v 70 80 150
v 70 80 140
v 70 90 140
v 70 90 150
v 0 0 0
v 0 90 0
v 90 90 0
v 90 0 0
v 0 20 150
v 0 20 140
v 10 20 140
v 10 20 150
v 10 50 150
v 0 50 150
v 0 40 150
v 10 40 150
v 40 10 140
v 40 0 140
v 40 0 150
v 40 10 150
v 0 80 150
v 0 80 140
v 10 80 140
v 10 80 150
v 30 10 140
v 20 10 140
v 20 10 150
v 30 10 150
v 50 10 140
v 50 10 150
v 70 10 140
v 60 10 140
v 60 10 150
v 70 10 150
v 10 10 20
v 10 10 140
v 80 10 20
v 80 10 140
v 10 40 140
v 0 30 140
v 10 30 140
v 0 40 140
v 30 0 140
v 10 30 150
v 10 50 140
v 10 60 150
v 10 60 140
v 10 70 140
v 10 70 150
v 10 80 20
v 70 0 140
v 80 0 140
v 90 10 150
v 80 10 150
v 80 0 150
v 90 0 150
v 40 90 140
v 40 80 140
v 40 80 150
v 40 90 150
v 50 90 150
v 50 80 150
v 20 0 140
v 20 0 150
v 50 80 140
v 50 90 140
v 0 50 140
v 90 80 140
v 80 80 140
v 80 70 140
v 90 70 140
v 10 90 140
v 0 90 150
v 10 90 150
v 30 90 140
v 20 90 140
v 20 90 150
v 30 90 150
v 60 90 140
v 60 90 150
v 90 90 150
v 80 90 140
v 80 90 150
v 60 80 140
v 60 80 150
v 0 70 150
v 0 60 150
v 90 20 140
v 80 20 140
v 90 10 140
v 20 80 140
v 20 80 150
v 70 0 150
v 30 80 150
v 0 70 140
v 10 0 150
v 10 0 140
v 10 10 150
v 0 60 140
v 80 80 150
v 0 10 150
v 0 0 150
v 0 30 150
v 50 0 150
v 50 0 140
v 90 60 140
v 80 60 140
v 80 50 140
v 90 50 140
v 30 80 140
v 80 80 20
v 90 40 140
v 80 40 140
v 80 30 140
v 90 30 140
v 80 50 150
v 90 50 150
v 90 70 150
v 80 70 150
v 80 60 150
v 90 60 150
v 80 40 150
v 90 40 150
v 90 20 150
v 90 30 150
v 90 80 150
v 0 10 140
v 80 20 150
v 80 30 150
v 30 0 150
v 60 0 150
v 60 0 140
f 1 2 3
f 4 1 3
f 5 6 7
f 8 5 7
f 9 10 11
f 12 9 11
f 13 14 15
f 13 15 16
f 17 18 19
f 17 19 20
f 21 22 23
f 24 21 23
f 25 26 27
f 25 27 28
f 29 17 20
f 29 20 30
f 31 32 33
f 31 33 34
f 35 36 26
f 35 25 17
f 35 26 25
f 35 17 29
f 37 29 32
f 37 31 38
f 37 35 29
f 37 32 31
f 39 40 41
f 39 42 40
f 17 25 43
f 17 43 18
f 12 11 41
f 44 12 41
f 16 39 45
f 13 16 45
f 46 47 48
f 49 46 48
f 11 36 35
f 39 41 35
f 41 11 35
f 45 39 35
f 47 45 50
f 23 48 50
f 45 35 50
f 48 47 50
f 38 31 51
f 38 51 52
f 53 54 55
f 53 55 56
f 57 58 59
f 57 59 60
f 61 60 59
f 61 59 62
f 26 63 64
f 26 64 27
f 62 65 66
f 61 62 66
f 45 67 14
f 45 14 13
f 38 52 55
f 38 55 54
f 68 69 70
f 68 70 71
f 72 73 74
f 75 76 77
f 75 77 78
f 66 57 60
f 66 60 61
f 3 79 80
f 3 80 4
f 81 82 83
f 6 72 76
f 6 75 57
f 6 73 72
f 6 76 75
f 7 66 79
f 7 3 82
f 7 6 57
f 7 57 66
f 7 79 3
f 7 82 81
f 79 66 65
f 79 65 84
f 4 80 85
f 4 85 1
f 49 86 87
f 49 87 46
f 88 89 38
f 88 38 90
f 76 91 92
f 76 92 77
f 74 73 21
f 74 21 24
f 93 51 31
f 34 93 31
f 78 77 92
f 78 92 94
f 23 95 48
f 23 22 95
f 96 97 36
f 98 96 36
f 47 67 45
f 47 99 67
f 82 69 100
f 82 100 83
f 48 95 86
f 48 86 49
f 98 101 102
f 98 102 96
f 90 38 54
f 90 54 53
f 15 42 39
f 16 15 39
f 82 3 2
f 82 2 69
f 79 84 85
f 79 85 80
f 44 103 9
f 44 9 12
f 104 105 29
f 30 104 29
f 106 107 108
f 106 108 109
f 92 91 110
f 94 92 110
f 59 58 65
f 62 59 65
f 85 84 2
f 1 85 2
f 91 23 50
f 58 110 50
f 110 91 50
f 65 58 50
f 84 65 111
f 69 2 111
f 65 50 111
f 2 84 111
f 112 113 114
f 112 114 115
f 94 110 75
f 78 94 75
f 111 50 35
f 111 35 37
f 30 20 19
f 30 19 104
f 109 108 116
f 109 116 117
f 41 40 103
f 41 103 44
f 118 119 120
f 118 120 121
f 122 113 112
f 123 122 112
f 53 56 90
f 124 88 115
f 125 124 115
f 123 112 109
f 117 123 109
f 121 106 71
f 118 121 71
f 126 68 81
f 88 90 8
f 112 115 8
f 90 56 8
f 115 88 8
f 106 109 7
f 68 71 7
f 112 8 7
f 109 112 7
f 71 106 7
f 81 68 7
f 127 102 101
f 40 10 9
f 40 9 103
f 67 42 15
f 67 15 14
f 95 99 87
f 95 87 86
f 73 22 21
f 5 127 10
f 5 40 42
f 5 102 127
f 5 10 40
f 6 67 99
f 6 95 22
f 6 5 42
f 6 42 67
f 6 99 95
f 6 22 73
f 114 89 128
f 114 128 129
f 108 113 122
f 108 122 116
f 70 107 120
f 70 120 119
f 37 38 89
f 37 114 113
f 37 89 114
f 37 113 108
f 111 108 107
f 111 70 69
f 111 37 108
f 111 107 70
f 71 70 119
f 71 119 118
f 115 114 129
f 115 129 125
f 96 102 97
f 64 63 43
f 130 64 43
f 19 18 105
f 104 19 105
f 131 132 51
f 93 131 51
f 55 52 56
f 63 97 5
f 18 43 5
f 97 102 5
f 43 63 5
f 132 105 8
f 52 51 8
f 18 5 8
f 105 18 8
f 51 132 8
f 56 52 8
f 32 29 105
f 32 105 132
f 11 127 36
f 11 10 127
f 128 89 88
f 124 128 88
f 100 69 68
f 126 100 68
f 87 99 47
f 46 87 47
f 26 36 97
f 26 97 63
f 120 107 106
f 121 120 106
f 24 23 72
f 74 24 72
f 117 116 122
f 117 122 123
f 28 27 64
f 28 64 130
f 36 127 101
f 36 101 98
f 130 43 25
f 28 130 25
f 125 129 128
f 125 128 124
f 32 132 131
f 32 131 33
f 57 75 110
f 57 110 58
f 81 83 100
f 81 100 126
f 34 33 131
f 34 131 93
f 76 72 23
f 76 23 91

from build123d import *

# Parameters (mm, degrees)
BOX001_W         = 10
BOX001_H         = 110
BOX001_DEPTH     = 10
ARRAY001_X_COUNT = 4
ARRAY001_X_PITCH = 20
BOX_W            = 110
BOX_H            = 10
BOX_DEPTH        = 10
ARRAY_Y_COUNT    = 4
ARRAY_Y_PITCH    = 20
BOX003_W         = 70
BOX003_H         = 70
BOX003_DEPTH     = 130
BOX002_W         = 90
BOX002_H         = 90
BOX002_DEPTH     = 150


with BuildPart() as array001:
    # Box001 → Box001 (new body)
    with BuildSketch(Plane.XY):
        with Locations((5, 55)):
            Rectangle(BOX001_W, BOX001_H)
    extrude(amount=BOX001_DEPTH)

    # Array001 X: Array001 ×4


with BuildPart() as array001_1:
    add(array001.part)
    with Locations(*[(i * ARRAY001_X_PITCH, 0, 0) for i in range(1, ARRAY001_X_COUNT)]):
        add(array001.part)


with BuildPart() as array001_2:
    # Array001 placement: moved
    add(array001_1.part.moved(Location((20, -20, 0))))


with BuildPart() as fusion:
    # Box → Box (new body)
    with BuildSketch(Plane.XY):
        with Locations((55, 5)):
            Rectangle(BOX_W, BOX_H)
    extrude(amount=BOX_DEPTH)

    # Array Y: Fusion ×4


with BuildPart() as fusion_1:
    add(fusion.part)
    with Locations(*[(0, i * ARRAY_Y_PITCH, 0) for i in range(1, ARRAY_Y_COUNT)]):
        add(fusion.part)

    # Fusion: union Array001
    add(array001_2.part)


with BuildPart() as fusion_2:
    # Fusion placement: moved
    add(fusion_1.part.moved(Location((-10, 10, 140))))


with BuildPart() as cub003:
    # Box003 → Box003 (new body)
    with BuildSketch(Plane(origin=(10, 10, 20), x_dir=(1, 0, 0), z_dir=(0, 0, 1))):
        with Locations((35, 35)):
            Rectangle(BOX003_W, BOX003_H)
    extrude(amount=BOX003_DEPTH)


with BuildPart() as cut001:
    # Box002 → Box002 (new body)
    with BuildSketch(Plane.XY):
        with Locations((45, 45)):
            Rectangle(BOX002_W, BOX002_H)
    extrude(amount=BOX002_DEPTH)

    # Cut: cut Cub003
    add(cub003.part, mode=Mode.SUBTRACT)

    # Cut001: cut Fusion
    add(fusion_2.part, mode=Mode.SUBTRACT)


solid = cut001.part
